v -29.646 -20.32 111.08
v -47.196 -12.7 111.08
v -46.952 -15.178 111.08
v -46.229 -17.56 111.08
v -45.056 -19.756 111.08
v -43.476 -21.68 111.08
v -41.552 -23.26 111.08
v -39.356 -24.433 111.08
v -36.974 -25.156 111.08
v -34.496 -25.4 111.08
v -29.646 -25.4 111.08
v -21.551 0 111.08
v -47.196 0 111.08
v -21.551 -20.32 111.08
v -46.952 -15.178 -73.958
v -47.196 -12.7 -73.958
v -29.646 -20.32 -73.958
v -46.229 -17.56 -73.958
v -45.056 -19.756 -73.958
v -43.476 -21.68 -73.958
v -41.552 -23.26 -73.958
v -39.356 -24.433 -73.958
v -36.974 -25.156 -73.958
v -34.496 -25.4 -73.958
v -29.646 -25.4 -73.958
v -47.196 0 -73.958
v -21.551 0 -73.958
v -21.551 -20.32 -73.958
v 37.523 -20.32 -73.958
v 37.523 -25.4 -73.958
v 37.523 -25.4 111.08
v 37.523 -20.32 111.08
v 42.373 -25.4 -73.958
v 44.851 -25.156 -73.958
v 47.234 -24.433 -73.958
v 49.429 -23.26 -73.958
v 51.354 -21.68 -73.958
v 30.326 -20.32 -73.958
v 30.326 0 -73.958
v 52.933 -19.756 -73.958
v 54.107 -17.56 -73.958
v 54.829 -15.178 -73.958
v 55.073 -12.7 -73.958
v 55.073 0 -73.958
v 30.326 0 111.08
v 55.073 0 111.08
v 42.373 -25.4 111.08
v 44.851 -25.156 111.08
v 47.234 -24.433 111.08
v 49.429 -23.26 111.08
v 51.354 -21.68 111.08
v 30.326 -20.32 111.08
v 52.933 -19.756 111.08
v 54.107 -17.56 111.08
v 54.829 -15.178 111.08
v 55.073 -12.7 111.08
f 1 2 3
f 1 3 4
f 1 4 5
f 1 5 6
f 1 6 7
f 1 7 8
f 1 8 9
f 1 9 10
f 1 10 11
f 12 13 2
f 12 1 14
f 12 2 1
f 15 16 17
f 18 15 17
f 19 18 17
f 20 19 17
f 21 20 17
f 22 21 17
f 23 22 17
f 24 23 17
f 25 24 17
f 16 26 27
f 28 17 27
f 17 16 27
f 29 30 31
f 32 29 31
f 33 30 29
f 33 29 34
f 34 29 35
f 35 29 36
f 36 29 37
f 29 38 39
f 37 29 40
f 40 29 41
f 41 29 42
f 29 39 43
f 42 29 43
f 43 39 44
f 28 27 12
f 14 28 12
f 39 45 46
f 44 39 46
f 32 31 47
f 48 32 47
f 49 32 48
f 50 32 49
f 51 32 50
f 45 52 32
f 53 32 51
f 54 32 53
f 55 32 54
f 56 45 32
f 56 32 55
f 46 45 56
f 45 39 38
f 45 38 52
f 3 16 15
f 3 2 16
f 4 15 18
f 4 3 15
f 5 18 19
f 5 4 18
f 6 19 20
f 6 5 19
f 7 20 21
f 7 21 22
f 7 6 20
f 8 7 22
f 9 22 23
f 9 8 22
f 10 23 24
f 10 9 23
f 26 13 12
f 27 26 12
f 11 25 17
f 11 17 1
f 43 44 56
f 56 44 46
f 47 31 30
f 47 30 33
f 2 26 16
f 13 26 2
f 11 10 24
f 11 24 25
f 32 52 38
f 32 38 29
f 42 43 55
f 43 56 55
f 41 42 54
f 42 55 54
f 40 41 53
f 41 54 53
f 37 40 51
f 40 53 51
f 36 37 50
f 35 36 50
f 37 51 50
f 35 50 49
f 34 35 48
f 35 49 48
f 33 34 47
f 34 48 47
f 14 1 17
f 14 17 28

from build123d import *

# Parameters (mm, degrees)
F0_W     = 102.269672
F0_H     = 185.038254
F1_DEPTH = 25.4
F2_R     = 12.7
F3_W     = 51.877454
F3_H     = 185.038254
F4_DEPTH = 21.59
F5_W     = 67.168505
F5_H     = 185.038254
F6_DEPTH = 5.08


with BuildPart() as f1:
    # F0 (on Front) → F1 (new body)
    with BuildSketch(Plane.XZ):
        with Locations((3.938619, 18.561065)):
            Rectangle(F0_W, F0_H)
    extrude(amount=F1_DEPTH)

    # F2
    f2_edges = [f1.edges().sort_by_distance(p)[0] for p in [
        (55.073455, -25.4, 18.561065),
        (-47.196217, -25.4, 18.561065),
    ]]
    fillet(f2_edges, radius=F2_R)

    # F3 (on face) → F4 (cut)
    with BuildSketch(Plane(origin=(0, 0, 0), x_dir=(-1, 0, 0), z_dir=(0, 1, 0))):
        with Locations((-4.387645, 18.561065)):
            Rectangle(F3_W, F3_H)
    extrude(amount=-F4_DEPTH, mode=Mode.SUBTRACT)

    # F5 (on face) → F6 (cut)
    with BuildSketch(Plane.XZ.offset(25.4)):
        with Locations((3.938623, 18.561065)):
            Rectangle(F5_W, F5_H)
    extrude(amount=-F6_DEPTH, mode=Mode.SUBTRACT)


solid = f1.part
